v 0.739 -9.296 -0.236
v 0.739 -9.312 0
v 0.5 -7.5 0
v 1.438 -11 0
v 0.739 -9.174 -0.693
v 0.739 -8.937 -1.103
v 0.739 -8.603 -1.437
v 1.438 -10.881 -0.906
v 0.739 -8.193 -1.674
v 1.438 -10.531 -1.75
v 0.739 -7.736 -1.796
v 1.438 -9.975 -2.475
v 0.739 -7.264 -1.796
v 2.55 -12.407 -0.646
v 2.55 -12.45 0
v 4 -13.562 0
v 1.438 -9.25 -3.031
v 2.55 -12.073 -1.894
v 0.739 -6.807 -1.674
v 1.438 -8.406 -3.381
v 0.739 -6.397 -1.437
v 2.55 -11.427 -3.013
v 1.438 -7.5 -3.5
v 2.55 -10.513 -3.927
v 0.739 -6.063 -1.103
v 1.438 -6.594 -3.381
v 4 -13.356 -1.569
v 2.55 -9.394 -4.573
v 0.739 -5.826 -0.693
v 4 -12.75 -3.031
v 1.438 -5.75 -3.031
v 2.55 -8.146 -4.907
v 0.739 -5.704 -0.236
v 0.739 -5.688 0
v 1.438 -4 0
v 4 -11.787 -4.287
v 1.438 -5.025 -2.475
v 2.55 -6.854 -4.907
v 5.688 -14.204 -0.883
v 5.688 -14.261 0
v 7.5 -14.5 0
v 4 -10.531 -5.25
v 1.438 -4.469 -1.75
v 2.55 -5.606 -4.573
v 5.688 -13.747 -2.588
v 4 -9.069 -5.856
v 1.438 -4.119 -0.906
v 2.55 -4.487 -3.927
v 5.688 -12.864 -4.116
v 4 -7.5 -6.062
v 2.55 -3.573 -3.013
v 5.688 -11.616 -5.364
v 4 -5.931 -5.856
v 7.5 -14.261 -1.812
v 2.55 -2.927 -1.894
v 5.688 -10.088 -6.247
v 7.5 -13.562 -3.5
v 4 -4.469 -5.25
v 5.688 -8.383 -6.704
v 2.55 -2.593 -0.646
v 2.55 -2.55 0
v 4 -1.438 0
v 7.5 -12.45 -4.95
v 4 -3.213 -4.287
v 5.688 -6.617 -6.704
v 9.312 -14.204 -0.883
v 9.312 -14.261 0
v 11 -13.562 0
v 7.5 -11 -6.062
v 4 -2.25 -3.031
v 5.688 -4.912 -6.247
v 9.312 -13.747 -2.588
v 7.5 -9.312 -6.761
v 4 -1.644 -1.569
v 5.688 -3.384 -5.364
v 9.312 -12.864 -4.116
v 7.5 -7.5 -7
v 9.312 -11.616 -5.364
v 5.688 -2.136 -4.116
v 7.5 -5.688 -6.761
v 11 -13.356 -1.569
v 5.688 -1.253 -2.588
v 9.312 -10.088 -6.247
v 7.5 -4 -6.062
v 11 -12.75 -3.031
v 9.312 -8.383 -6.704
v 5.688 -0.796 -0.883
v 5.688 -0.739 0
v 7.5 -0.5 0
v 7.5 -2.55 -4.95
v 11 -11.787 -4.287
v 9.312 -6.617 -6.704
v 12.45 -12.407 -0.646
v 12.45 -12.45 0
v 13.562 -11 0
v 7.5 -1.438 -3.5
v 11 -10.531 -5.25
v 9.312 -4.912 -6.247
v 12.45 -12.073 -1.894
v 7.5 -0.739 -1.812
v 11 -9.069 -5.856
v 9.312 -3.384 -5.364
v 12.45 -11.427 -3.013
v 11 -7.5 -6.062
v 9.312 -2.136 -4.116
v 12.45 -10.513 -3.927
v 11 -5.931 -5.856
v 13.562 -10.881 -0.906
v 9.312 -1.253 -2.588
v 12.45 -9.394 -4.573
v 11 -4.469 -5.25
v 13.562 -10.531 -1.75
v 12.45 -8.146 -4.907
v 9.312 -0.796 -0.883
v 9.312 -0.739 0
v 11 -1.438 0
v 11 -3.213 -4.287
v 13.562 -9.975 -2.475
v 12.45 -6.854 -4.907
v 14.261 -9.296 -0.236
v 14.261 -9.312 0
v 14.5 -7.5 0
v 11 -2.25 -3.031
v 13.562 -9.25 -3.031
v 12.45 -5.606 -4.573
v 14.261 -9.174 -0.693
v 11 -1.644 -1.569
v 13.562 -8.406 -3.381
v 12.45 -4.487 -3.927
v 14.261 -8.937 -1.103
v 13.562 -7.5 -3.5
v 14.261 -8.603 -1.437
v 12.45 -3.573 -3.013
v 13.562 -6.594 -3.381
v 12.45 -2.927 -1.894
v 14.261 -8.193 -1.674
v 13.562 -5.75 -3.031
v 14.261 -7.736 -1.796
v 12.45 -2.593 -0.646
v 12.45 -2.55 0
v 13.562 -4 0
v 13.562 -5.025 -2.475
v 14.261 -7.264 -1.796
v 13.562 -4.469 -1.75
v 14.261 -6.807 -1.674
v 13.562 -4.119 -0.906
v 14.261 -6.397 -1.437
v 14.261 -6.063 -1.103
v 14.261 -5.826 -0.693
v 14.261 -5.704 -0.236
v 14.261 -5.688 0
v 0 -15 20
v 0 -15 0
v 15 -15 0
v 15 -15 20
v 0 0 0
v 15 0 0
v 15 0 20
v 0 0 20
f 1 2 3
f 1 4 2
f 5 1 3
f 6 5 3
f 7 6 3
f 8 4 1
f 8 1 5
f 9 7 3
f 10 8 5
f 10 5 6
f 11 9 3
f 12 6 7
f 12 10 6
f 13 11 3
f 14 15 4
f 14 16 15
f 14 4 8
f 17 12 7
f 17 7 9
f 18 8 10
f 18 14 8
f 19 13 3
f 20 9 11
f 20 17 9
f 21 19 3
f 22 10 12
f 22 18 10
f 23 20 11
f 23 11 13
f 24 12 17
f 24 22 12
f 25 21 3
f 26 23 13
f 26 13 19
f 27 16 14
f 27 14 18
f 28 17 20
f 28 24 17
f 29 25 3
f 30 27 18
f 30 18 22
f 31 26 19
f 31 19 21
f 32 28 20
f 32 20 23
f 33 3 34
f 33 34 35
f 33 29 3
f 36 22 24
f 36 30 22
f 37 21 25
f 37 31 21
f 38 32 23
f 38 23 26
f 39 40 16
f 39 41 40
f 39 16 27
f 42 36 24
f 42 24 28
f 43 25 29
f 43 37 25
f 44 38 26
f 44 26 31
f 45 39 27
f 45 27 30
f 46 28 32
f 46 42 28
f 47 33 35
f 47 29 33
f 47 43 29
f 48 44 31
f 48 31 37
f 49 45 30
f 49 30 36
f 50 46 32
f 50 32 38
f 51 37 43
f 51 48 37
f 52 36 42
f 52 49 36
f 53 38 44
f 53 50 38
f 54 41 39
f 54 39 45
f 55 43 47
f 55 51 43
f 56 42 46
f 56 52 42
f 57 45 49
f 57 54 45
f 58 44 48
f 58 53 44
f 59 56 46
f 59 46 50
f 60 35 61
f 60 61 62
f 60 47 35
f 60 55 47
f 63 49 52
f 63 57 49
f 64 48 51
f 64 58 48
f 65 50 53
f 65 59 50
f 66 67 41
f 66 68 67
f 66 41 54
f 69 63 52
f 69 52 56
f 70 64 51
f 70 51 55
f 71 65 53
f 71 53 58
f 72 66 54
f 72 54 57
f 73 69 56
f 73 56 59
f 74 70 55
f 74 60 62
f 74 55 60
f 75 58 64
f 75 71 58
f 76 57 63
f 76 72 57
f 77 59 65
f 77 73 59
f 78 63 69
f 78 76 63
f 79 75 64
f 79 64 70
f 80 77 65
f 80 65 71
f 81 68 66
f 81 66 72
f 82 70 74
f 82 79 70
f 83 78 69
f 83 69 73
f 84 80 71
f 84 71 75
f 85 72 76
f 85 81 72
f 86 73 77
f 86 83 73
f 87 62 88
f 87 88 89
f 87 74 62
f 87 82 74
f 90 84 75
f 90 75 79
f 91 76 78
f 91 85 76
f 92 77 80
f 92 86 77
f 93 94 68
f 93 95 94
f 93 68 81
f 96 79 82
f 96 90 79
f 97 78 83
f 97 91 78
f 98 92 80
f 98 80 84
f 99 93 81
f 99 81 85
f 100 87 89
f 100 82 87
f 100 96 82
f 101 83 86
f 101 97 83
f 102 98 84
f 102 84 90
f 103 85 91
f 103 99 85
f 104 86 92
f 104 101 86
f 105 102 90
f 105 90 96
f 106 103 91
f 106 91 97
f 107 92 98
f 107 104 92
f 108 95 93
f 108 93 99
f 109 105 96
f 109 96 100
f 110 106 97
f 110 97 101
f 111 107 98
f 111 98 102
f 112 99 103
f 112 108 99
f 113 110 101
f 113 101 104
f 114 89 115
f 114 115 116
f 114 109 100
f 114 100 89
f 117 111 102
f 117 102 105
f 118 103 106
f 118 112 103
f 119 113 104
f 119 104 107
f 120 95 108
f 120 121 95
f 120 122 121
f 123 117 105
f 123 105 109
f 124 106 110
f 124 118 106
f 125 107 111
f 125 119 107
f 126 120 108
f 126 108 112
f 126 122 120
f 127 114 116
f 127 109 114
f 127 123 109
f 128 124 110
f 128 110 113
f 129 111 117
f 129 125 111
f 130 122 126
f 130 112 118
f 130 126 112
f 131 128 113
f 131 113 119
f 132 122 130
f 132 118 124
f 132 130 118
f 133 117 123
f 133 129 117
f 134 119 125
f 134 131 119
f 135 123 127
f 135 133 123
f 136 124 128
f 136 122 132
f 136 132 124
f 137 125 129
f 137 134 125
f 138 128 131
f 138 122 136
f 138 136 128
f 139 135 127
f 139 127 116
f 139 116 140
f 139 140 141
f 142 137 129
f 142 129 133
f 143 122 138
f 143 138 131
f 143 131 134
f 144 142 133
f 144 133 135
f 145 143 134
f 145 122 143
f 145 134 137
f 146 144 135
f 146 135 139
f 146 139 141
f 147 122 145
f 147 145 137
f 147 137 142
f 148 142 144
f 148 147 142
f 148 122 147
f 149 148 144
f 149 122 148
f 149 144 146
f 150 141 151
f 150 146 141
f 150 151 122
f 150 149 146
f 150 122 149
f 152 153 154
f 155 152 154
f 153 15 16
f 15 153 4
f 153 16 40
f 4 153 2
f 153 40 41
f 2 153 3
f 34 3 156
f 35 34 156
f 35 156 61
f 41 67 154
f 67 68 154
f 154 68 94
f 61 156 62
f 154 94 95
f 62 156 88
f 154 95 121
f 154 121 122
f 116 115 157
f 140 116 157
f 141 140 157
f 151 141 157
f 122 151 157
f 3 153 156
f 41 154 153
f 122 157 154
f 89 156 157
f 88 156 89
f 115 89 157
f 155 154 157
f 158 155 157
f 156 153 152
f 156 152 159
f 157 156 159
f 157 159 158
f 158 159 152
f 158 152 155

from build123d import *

# Parameters (mm, degrees)
SKETCH1_W           = 15
SKETCH1_H           = 15
BOSS_EXTRUDE1_DEPTH = 20
REVOLVE1_ANGLE      = 180


with BuildPart() as part:
    # Sketch1 → Boss-Extrude1 (new body)
    with BuildSketch(Plane.XY):
        with Locations((7.5, -7.5)):
            Rectangle(SKETCH1_W, SKETCH1_H)
    extrude(amount=BOSS_EXTRUDE1_DEPTH)

    # Sketch2 → Revolve1 (revolve)
    with BuildSketch(Plane(origin=(0, 0, 0), x_dir=(-1, 0, 0), z_dir=(0, 0, -1))):
        with BuildLine():
            Line((-14.5, -7.5), (-0.5, -7.5))
            ThreePointArc((-0.5, -7.5), (-7.5, -14.5), (-14.5, -7.5))
        make_face()
    revolve(axis=Axis((14.5, -7.5, 0), (1, 0, 0)), revolution_arc=REVOLVE1_ANGLE)


solid = part.part
